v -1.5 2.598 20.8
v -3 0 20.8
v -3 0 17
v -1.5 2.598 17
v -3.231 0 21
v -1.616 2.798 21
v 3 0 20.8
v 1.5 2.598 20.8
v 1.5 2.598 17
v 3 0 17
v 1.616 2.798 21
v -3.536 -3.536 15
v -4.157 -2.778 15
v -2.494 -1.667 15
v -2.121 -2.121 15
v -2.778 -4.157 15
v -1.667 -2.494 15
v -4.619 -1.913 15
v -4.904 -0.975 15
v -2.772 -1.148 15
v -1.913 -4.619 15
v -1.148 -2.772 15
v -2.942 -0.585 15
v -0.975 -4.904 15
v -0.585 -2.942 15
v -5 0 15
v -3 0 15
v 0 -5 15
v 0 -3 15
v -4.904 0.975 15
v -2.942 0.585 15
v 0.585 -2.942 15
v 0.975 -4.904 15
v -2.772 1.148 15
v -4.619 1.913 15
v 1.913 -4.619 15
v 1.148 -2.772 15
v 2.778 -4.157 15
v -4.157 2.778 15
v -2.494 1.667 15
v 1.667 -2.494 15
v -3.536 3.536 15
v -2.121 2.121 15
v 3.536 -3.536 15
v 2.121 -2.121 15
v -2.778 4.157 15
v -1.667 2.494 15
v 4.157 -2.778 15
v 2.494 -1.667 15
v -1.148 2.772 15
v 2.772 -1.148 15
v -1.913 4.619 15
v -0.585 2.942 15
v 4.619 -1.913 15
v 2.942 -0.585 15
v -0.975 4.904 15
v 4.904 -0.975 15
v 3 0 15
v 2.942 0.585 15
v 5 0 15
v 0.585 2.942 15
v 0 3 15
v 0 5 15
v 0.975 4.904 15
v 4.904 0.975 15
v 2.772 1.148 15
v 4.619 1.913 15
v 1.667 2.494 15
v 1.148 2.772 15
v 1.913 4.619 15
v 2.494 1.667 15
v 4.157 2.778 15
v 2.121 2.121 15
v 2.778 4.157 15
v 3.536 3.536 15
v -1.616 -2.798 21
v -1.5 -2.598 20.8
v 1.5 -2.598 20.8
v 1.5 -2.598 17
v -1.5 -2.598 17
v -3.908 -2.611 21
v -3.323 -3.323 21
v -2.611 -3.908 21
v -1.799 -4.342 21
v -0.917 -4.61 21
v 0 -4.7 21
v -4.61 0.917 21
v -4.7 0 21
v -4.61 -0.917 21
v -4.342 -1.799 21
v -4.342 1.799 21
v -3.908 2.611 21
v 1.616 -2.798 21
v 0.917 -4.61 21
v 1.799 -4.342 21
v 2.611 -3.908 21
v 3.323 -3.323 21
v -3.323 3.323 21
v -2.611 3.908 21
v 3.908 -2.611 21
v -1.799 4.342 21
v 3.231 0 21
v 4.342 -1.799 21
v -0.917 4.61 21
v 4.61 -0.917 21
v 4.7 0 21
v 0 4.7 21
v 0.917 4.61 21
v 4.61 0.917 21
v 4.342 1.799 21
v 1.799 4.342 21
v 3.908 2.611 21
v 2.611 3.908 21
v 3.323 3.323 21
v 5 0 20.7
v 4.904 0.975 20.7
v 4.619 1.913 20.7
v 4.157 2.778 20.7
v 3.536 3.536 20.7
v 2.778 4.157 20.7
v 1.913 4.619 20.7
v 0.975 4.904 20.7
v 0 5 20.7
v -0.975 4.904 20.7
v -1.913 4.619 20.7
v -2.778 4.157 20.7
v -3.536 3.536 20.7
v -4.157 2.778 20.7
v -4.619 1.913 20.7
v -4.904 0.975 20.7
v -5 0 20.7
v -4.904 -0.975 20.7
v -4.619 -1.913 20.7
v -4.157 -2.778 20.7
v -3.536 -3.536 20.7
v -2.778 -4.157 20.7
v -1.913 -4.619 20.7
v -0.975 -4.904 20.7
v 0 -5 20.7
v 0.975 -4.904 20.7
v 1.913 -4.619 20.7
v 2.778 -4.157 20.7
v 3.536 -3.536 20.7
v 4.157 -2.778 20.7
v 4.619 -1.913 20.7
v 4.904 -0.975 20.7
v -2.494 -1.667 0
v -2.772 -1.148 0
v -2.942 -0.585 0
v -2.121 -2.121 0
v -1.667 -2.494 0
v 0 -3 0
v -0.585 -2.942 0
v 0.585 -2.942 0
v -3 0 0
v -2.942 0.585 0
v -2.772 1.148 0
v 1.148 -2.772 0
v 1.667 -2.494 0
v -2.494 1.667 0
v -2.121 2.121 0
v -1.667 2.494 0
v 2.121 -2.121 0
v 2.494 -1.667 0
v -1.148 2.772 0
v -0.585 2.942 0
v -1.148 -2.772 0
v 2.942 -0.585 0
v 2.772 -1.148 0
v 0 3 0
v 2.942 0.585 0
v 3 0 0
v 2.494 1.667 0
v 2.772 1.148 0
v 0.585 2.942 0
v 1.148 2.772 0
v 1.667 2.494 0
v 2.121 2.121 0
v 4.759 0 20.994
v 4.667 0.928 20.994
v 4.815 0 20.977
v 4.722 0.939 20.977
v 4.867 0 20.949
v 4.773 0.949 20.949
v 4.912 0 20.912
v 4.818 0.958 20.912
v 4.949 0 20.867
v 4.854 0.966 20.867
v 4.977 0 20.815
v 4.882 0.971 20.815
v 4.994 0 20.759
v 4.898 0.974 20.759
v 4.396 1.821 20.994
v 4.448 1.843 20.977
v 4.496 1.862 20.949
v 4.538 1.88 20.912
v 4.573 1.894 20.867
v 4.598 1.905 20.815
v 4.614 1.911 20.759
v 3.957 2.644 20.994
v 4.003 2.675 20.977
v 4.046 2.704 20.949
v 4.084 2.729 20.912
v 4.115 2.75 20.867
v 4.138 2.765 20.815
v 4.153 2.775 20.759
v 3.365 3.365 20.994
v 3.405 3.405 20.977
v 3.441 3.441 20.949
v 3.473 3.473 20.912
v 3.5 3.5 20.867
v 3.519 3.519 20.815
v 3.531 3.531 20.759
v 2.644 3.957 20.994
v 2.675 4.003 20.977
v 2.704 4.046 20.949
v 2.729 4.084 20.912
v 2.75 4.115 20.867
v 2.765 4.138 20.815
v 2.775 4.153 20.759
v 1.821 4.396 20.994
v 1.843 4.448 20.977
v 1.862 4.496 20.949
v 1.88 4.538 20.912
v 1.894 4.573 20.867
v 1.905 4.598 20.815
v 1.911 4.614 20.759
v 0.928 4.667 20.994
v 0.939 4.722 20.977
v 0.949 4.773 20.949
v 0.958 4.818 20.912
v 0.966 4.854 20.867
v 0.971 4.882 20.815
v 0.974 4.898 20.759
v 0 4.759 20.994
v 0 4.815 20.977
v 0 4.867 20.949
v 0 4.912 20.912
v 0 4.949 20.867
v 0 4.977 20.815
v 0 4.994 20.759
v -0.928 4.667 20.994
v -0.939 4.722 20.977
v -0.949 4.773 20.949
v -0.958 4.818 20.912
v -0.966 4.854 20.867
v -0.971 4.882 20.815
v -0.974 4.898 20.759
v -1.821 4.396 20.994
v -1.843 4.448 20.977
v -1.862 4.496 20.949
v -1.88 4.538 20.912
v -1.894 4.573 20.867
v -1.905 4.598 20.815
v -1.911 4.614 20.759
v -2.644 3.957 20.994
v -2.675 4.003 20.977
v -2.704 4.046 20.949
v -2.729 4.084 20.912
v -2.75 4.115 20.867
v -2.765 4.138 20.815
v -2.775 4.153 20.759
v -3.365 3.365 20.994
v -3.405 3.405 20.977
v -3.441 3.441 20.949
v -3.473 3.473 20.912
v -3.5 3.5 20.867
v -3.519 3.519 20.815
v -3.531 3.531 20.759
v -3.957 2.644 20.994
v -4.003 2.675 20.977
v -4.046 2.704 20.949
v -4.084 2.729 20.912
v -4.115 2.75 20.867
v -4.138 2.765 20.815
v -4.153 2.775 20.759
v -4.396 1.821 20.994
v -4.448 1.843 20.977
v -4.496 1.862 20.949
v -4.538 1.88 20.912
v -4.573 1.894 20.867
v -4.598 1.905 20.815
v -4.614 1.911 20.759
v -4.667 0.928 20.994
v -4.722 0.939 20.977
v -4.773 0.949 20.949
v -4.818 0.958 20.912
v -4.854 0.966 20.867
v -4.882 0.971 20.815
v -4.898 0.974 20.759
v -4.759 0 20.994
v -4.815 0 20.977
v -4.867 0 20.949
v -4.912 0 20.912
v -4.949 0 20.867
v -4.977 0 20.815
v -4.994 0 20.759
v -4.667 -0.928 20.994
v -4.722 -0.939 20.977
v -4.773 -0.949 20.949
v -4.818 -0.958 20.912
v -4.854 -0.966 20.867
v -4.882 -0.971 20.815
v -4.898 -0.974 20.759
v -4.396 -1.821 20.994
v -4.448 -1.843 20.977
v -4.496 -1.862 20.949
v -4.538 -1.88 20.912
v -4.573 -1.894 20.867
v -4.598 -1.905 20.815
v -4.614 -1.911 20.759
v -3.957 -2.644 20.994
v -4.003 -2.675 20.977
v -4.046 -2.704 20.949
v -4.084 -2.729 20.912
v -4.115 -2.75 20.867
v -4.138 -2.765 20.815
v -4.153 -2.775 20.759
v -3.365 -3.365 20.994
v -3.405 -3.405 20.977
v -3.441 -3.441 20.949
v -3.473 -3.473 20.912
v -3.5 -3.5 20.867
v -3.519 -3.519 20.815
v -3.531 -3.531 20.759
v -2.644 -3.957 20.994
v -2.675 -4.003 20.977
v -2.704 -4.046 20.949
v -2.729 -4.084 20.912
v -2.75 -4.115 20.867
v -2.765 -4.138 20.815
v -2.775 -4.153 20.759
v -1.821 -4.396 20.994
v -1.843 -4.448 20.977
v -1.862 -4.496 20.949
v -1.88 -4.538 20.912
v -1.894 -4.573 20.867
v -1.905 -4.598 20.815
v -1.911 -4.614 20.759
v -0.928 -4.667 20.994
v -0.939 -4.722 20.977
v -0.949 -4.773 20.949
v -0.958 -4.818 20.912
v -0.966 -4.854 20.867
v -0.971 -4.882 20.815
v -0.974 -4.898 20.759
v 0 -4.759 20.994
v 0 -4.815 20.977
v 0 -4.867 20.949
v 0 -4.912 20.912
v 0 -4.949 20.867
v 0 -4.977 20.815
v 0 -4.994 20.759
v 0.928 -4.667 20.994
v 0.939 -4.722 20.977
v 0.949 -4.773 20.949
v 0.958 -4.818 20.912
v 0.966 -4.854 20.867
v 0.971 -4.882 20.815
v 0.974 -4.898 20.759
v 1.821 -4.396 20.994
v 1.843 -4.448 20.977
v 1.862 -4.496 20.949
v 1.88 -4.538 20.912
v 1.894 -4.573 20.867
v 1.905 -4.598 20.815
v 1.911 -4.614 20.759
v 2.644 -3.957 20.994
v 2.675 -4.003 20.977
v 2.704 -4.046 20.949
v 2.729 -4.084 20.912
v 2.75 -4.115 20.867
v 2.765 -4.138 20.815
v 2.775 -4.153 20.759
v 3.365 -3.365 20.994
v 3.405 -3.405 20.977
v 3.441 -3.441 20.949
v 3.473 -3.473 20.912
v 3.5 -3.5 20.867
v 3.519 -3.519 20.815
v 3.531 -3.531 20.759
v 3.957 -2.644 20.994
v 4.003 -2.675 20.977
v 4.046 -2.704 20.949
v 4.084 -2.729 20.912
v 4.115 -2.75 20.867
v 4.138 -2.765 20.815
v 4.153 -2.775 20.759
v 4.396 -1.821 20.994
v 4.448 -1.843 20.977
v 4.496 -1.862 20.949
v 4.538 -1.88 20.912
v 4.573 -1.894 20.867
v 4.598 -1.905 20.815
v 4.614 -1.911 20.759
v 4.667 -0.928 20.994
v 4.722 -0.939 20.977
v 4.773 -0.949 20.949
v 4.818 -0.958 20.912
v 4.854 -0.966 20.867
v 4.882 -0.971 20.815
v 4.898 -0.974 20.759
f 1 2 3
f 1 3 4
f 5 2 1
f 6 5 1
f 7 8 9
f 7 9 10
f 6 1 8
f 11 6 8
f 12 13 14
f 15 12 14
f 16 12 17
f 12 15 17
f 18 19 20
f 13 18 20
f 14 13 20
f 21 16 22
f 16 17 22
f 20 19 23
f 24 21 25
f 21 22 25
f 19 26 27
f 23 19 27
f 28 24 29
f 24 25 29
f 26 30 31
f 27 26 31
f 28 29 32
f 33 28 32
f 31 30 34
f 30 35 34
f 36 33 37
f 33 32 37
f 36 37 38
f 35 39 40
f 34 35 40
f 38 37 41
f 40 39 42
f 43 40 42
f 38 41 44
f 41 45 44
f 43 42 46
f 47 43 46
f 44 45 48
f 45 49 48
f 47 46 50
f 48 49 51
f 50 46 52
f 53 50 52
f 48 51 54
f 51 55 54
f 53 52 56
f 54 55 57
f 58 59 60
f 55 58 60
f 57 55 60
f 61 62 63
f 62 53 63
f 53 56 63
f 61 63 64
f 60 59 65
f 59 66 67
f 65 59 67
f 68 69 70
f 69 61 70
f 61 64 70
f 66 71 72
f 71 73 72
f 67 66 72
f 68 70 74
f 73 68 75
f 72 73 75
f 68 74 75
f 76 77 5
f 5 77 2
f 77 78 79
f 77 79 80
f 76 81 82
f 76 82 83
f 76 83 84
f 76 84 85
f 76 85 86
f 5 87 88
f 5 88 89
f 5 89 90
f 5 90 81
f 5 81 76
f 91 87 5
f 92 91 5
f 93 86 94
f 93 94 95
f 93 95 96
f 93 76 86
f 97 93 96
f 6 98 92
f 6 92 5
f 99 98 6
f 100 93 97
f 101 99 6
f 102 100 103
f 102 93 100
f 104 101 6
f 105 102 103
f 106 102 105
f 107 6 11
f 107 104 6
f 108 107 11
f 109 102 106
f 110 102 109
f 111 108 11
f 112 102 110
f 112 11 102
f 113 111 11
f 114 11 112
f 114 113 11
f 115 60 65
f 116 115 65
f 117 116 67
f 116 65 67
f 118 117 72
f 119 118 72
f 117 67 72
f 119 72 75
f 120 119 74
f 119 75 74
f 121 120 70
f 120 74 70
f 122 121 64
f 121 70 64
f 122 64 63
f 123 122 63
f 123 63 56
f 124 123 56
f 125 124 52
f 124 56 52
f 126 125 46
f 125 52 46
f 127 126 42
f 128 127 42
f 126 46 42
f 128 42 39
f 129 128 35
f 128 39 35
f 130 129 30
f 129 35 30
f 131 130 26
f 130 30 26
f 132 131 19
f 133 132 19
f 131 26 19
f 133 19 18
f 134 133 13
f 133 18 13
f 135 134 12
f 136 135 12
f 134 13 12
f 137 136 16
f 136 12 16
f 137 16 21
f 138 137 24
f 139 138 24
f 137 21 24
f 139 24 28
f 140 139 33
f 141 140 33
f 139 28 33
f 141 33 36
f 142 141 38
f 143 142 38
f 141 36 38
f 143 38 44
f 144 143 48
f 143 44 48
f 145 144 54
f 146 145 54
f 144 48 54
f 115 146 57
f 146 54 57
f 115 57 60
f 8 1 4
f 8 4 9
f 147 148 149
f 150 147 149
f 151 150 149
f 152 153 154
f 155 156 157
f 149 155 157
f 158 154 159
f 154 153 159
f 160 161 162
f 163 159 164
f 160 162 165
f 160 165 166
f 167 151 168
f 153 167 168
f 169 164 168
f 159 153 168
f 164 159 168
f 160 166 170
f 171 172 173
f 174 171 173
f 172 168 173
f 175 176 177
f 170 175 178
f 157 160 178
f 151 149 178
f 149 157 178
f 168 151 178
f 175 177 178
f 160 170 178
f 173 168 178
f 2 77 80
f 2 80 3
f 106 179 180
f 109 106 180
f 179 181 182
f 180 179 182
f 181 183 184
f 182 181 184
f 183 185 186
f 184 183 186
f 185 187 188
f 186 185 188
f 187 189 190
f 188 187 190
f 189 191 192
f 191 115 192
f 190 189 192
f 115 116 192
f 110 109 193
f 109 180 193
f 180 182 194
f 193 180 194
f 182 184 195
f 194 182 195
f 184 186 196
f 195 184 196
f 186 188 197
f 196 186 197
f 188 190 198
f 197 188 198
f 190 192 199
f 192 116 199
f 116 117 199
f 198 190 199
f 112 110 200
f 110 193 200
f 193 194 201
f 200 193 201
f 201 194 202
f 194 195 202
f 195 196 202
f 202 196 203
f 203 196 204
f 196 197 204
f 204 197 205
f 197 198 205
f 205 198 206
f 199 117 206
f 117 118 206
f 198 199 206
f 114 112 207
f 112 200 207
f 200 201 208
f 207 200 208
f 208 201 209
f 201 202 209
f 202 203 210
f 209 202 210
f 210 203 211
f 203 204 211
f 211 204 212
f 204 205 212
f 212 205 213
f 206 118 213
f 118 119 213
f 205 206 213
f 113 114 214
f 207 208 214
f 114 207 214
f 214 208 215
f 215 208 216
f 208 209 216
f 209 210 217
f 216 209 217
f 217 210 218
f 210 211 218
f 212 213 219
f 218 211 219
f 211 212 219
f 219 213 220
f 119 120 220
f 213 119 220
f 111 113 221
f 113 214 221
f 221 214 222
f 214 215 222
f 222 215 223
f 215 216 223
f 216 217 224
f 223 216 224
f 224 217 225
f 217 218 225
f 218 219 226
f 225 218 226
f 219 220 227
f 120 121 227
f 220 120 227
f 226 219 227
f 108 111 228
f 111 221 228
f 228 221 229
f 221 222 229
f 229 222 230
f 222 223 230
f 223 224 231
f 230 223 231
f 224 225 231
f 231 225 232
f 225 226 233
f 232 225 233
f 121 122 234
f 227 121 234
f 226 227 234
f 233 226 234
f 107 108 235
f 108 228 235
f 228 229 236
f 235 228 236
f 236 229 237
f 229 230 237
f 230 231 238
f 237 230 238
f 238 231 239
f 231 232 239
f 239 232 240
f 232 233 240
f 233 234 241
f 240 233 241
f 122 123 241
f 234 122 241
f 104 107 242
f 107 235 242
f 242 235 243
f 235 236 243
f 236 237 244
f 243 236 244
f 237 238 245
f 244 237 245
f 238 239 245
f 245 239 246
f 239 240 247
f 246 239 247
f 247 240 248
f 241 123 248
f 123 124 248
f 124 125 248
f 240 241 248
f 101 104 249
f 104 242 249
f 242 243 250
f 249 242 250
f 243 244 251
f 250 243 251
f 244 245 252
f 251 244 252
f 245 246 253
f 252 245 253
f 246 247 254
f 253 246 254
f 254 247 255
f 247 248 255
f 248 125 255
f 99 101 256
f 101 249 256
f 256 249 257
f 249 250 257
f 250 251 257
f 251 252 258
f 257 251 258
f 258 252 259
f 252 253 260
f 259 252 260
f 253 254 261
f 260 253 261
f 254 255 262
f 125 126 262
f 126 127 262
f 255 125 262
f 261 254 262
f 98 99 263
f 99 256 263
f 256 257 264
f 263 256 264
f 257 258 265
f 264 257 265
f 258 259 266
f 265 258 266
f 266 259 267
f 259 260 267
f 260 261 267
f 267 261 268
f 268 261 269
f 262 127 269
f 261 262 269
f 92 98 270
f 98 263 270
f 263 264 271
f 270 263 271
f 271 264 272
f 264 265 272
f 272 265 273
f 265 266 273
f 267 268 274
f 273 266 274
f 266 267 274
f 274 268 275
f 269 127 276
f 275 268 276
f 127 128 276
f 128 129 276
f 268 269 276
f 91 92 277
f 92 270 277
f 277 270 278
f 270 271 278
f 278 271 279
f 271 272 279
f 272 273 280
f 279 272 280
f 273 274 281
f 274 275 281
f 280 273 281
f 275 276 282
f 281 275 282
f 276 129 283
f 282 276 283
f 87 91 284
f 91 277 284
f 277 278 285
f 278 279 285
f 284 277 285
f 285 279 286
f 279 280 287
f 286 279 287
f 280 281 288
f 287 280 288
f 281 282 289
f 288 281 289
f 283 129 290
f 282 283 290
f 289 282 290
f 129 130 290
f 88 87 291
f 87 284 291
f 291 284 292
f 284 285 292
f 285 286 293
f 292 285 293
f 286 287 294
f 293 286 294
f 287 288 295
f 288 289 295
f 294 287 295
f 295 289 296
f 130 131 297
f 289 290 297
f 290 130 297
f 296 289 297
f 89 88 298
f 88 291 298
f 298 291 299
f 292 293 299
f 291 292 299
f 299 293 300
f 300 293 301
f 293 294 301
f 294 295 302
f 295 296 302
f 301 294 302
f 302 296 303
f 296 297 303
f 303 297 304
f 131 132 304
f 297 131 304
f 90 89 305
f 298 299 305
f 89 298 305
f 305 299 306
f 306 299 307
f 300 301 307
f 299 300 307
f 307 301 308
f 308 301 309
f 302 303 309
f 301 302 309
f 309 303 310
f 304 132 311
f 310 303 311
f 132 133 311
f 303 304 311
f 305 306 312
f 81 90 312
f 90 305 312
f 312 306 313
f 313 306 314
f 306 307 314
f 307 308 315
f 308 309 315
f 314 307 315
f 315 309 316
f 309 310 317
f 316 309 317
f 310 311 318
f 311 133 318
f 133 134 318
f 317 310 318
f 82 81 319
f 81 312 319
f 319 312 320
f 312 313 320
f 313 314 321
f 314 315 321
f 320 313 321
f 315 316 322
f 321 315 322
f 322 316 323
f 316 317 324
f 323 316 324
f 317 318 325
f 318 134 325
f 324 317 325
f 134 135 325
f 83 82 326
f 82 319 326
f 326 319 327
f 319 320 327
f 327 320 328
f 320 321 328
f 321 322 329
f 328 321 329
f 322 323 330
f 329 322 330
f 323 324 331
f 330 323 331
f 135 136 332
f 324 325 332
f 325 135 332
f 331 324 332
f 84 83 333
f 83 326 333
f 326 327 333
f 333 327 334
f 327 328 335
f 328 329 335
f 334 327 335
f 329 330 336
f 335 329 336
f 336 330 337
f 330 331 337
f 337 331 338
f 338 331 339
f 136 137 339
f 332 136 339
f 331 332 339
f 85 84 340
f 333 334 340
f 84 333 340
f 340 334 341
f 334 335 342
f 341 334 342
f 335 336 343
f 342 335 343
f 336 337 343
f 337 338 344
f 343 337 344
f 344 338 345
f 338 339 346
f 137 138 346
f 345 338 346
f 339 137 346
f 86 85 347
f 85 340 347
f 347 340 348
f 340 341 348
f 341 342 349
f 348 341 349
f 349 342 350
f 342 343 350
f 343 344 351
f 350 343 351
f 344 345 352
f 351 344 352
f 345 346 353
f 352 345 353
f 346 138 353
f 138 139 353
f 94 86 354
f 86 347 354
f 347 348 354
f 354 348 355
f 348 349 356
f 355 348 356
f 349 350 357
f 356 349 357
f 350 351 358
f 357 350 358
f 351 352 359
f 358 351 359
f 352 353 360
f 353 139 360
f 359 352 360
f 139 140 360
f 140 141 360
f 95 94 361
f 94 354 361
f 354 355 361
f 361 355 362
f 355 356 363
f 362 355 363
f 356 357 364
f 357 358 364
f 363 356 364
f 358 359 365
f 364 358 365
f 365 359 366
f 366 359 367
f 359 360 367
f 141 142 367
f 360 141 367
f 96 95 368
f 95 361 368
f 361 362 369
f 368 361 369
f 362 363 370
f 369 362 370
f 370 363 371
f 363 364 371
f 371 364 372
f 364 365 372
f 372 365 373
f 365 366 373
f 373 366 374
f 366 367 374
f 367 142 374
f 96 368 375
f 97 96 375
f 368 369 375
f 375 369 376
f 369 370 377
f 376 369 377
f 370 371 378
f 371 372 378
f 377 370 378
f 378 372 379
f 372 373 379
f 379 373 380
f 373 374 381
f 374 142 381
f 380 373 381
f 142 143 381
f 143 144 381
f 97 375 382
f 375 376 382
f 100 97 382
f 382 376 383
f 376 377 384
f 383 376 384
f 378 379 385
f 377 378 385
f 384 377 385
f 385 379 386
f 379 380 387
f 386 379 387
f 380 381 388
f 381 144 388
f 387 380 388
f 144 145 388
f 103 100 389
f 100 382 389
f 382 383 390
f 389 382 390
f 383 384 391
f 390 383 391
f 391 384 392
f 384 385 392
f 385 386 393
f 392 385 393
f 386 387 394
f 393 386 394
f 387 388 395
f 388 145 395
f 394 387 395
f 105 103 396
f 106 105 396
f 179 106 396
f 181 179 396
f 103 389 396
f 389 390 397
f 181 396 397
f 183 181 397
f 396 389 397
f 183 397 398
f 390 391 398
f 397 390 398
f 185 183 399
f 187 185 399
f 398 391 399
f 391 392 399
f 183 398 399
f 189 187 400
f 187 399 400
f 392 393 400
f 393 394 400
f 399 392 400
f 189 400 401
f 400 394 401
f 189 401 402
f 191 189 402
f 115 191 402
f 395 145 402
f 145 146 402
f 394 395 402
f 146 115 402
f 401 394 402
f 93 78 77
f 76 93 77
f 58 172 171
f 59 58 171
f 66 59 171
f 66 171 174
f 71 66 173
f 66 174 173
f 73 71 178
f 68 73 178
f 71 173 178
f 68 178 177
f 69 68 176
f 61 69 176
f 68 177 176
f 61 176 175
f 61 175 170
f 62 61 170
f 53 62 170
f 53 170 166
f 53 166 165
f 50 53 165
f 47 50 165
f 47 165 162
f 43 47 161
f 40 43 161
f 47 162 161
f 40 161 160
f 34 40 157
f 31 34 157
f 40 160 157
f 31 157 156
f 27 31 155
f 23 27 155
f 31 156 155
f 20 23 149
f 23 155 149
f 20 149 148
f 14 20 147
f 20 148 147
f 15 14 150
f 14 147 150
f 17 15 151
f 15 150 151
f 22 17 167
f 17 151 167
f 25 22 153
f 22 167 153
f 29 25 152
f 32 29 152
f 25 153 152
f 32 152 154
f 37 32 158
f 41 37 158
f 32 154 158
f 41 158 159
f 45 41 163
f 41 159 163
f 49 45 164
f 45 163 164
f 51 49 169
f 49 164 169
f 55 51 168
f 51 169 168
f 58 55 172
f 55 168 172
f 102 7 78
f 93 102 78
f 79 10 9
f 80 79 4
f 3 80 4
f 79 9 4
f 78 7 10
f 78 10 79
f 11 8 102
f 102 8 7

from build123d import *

# Parameters (mm, degrees)
ESQUISSE1_R             = 3
BASE_EXTRUSION_DEPTH    = 15
ESQUISSE2_R             = 5
BOSS_EXTRU_1_DEPTH      = 6
ENL_V_MAT_EXTRU_1_DEPTH = 4
CHANFREIN3_SIZE         = 0.2
CONG_1_R                = 0.3


with BuildPart() as part:
    # Esquisse1 → Base-Extrusion (new body)
    with BuildSketch(Plane.XY):
        Circle(ESQUISSE1_R)
    extrude(amount=BASE_EXTRUSION_DEPTH)

    # Esquisse2 → Boss.-Extru.1 (add)
    with BuildSketch(Plane.XY.offset(15)):
        Circle(ESQUISSE2_R)
    extrude(amount=BOSS_EXTRU_1_DEPTH)

    # Esquisse3 → Enlèv. mat.-Extru.1 (cut)
    with BuildSketch(Plane.XY.offset(21)):
        Polygon((-3, 0), (-1.500108314, 2.598013673), (1.500108314, 2.598013673), (3, 0), (1.500108314, -2.598013673), (-1.500108314, -2.598013673), align=None)
    extrude(amount=-ENL_V_MAT_EXTRU_1_DEPTH, mode=Mode.SUBTRACT)

    # Chanfrein3
    chanfrein3_edges = [part.edges().sort_by_distance(p)[0] for p in [
        (-2.250054157, -1.299006837, 21),
        (0, -2.598013673, 21),
        (2.250054157, -1.299006837, 21),
        (2.250054157, 1.299006837, 21),
        (0, 2.598013673, 21),
        (-2.250054157, 1.299006837, 21),
    ]]
    chamfer(chanfrein3_edges, length=CHANFREIN3_SIZE)

    # Congé1
    cong_1_edges = [part.edges().sort_by_distance(p)[0] for p in [
        (-5, 0, 21),
    ]]
    fillet(cong_1_edges, radius=CONG_1_R)


solid = part.part
